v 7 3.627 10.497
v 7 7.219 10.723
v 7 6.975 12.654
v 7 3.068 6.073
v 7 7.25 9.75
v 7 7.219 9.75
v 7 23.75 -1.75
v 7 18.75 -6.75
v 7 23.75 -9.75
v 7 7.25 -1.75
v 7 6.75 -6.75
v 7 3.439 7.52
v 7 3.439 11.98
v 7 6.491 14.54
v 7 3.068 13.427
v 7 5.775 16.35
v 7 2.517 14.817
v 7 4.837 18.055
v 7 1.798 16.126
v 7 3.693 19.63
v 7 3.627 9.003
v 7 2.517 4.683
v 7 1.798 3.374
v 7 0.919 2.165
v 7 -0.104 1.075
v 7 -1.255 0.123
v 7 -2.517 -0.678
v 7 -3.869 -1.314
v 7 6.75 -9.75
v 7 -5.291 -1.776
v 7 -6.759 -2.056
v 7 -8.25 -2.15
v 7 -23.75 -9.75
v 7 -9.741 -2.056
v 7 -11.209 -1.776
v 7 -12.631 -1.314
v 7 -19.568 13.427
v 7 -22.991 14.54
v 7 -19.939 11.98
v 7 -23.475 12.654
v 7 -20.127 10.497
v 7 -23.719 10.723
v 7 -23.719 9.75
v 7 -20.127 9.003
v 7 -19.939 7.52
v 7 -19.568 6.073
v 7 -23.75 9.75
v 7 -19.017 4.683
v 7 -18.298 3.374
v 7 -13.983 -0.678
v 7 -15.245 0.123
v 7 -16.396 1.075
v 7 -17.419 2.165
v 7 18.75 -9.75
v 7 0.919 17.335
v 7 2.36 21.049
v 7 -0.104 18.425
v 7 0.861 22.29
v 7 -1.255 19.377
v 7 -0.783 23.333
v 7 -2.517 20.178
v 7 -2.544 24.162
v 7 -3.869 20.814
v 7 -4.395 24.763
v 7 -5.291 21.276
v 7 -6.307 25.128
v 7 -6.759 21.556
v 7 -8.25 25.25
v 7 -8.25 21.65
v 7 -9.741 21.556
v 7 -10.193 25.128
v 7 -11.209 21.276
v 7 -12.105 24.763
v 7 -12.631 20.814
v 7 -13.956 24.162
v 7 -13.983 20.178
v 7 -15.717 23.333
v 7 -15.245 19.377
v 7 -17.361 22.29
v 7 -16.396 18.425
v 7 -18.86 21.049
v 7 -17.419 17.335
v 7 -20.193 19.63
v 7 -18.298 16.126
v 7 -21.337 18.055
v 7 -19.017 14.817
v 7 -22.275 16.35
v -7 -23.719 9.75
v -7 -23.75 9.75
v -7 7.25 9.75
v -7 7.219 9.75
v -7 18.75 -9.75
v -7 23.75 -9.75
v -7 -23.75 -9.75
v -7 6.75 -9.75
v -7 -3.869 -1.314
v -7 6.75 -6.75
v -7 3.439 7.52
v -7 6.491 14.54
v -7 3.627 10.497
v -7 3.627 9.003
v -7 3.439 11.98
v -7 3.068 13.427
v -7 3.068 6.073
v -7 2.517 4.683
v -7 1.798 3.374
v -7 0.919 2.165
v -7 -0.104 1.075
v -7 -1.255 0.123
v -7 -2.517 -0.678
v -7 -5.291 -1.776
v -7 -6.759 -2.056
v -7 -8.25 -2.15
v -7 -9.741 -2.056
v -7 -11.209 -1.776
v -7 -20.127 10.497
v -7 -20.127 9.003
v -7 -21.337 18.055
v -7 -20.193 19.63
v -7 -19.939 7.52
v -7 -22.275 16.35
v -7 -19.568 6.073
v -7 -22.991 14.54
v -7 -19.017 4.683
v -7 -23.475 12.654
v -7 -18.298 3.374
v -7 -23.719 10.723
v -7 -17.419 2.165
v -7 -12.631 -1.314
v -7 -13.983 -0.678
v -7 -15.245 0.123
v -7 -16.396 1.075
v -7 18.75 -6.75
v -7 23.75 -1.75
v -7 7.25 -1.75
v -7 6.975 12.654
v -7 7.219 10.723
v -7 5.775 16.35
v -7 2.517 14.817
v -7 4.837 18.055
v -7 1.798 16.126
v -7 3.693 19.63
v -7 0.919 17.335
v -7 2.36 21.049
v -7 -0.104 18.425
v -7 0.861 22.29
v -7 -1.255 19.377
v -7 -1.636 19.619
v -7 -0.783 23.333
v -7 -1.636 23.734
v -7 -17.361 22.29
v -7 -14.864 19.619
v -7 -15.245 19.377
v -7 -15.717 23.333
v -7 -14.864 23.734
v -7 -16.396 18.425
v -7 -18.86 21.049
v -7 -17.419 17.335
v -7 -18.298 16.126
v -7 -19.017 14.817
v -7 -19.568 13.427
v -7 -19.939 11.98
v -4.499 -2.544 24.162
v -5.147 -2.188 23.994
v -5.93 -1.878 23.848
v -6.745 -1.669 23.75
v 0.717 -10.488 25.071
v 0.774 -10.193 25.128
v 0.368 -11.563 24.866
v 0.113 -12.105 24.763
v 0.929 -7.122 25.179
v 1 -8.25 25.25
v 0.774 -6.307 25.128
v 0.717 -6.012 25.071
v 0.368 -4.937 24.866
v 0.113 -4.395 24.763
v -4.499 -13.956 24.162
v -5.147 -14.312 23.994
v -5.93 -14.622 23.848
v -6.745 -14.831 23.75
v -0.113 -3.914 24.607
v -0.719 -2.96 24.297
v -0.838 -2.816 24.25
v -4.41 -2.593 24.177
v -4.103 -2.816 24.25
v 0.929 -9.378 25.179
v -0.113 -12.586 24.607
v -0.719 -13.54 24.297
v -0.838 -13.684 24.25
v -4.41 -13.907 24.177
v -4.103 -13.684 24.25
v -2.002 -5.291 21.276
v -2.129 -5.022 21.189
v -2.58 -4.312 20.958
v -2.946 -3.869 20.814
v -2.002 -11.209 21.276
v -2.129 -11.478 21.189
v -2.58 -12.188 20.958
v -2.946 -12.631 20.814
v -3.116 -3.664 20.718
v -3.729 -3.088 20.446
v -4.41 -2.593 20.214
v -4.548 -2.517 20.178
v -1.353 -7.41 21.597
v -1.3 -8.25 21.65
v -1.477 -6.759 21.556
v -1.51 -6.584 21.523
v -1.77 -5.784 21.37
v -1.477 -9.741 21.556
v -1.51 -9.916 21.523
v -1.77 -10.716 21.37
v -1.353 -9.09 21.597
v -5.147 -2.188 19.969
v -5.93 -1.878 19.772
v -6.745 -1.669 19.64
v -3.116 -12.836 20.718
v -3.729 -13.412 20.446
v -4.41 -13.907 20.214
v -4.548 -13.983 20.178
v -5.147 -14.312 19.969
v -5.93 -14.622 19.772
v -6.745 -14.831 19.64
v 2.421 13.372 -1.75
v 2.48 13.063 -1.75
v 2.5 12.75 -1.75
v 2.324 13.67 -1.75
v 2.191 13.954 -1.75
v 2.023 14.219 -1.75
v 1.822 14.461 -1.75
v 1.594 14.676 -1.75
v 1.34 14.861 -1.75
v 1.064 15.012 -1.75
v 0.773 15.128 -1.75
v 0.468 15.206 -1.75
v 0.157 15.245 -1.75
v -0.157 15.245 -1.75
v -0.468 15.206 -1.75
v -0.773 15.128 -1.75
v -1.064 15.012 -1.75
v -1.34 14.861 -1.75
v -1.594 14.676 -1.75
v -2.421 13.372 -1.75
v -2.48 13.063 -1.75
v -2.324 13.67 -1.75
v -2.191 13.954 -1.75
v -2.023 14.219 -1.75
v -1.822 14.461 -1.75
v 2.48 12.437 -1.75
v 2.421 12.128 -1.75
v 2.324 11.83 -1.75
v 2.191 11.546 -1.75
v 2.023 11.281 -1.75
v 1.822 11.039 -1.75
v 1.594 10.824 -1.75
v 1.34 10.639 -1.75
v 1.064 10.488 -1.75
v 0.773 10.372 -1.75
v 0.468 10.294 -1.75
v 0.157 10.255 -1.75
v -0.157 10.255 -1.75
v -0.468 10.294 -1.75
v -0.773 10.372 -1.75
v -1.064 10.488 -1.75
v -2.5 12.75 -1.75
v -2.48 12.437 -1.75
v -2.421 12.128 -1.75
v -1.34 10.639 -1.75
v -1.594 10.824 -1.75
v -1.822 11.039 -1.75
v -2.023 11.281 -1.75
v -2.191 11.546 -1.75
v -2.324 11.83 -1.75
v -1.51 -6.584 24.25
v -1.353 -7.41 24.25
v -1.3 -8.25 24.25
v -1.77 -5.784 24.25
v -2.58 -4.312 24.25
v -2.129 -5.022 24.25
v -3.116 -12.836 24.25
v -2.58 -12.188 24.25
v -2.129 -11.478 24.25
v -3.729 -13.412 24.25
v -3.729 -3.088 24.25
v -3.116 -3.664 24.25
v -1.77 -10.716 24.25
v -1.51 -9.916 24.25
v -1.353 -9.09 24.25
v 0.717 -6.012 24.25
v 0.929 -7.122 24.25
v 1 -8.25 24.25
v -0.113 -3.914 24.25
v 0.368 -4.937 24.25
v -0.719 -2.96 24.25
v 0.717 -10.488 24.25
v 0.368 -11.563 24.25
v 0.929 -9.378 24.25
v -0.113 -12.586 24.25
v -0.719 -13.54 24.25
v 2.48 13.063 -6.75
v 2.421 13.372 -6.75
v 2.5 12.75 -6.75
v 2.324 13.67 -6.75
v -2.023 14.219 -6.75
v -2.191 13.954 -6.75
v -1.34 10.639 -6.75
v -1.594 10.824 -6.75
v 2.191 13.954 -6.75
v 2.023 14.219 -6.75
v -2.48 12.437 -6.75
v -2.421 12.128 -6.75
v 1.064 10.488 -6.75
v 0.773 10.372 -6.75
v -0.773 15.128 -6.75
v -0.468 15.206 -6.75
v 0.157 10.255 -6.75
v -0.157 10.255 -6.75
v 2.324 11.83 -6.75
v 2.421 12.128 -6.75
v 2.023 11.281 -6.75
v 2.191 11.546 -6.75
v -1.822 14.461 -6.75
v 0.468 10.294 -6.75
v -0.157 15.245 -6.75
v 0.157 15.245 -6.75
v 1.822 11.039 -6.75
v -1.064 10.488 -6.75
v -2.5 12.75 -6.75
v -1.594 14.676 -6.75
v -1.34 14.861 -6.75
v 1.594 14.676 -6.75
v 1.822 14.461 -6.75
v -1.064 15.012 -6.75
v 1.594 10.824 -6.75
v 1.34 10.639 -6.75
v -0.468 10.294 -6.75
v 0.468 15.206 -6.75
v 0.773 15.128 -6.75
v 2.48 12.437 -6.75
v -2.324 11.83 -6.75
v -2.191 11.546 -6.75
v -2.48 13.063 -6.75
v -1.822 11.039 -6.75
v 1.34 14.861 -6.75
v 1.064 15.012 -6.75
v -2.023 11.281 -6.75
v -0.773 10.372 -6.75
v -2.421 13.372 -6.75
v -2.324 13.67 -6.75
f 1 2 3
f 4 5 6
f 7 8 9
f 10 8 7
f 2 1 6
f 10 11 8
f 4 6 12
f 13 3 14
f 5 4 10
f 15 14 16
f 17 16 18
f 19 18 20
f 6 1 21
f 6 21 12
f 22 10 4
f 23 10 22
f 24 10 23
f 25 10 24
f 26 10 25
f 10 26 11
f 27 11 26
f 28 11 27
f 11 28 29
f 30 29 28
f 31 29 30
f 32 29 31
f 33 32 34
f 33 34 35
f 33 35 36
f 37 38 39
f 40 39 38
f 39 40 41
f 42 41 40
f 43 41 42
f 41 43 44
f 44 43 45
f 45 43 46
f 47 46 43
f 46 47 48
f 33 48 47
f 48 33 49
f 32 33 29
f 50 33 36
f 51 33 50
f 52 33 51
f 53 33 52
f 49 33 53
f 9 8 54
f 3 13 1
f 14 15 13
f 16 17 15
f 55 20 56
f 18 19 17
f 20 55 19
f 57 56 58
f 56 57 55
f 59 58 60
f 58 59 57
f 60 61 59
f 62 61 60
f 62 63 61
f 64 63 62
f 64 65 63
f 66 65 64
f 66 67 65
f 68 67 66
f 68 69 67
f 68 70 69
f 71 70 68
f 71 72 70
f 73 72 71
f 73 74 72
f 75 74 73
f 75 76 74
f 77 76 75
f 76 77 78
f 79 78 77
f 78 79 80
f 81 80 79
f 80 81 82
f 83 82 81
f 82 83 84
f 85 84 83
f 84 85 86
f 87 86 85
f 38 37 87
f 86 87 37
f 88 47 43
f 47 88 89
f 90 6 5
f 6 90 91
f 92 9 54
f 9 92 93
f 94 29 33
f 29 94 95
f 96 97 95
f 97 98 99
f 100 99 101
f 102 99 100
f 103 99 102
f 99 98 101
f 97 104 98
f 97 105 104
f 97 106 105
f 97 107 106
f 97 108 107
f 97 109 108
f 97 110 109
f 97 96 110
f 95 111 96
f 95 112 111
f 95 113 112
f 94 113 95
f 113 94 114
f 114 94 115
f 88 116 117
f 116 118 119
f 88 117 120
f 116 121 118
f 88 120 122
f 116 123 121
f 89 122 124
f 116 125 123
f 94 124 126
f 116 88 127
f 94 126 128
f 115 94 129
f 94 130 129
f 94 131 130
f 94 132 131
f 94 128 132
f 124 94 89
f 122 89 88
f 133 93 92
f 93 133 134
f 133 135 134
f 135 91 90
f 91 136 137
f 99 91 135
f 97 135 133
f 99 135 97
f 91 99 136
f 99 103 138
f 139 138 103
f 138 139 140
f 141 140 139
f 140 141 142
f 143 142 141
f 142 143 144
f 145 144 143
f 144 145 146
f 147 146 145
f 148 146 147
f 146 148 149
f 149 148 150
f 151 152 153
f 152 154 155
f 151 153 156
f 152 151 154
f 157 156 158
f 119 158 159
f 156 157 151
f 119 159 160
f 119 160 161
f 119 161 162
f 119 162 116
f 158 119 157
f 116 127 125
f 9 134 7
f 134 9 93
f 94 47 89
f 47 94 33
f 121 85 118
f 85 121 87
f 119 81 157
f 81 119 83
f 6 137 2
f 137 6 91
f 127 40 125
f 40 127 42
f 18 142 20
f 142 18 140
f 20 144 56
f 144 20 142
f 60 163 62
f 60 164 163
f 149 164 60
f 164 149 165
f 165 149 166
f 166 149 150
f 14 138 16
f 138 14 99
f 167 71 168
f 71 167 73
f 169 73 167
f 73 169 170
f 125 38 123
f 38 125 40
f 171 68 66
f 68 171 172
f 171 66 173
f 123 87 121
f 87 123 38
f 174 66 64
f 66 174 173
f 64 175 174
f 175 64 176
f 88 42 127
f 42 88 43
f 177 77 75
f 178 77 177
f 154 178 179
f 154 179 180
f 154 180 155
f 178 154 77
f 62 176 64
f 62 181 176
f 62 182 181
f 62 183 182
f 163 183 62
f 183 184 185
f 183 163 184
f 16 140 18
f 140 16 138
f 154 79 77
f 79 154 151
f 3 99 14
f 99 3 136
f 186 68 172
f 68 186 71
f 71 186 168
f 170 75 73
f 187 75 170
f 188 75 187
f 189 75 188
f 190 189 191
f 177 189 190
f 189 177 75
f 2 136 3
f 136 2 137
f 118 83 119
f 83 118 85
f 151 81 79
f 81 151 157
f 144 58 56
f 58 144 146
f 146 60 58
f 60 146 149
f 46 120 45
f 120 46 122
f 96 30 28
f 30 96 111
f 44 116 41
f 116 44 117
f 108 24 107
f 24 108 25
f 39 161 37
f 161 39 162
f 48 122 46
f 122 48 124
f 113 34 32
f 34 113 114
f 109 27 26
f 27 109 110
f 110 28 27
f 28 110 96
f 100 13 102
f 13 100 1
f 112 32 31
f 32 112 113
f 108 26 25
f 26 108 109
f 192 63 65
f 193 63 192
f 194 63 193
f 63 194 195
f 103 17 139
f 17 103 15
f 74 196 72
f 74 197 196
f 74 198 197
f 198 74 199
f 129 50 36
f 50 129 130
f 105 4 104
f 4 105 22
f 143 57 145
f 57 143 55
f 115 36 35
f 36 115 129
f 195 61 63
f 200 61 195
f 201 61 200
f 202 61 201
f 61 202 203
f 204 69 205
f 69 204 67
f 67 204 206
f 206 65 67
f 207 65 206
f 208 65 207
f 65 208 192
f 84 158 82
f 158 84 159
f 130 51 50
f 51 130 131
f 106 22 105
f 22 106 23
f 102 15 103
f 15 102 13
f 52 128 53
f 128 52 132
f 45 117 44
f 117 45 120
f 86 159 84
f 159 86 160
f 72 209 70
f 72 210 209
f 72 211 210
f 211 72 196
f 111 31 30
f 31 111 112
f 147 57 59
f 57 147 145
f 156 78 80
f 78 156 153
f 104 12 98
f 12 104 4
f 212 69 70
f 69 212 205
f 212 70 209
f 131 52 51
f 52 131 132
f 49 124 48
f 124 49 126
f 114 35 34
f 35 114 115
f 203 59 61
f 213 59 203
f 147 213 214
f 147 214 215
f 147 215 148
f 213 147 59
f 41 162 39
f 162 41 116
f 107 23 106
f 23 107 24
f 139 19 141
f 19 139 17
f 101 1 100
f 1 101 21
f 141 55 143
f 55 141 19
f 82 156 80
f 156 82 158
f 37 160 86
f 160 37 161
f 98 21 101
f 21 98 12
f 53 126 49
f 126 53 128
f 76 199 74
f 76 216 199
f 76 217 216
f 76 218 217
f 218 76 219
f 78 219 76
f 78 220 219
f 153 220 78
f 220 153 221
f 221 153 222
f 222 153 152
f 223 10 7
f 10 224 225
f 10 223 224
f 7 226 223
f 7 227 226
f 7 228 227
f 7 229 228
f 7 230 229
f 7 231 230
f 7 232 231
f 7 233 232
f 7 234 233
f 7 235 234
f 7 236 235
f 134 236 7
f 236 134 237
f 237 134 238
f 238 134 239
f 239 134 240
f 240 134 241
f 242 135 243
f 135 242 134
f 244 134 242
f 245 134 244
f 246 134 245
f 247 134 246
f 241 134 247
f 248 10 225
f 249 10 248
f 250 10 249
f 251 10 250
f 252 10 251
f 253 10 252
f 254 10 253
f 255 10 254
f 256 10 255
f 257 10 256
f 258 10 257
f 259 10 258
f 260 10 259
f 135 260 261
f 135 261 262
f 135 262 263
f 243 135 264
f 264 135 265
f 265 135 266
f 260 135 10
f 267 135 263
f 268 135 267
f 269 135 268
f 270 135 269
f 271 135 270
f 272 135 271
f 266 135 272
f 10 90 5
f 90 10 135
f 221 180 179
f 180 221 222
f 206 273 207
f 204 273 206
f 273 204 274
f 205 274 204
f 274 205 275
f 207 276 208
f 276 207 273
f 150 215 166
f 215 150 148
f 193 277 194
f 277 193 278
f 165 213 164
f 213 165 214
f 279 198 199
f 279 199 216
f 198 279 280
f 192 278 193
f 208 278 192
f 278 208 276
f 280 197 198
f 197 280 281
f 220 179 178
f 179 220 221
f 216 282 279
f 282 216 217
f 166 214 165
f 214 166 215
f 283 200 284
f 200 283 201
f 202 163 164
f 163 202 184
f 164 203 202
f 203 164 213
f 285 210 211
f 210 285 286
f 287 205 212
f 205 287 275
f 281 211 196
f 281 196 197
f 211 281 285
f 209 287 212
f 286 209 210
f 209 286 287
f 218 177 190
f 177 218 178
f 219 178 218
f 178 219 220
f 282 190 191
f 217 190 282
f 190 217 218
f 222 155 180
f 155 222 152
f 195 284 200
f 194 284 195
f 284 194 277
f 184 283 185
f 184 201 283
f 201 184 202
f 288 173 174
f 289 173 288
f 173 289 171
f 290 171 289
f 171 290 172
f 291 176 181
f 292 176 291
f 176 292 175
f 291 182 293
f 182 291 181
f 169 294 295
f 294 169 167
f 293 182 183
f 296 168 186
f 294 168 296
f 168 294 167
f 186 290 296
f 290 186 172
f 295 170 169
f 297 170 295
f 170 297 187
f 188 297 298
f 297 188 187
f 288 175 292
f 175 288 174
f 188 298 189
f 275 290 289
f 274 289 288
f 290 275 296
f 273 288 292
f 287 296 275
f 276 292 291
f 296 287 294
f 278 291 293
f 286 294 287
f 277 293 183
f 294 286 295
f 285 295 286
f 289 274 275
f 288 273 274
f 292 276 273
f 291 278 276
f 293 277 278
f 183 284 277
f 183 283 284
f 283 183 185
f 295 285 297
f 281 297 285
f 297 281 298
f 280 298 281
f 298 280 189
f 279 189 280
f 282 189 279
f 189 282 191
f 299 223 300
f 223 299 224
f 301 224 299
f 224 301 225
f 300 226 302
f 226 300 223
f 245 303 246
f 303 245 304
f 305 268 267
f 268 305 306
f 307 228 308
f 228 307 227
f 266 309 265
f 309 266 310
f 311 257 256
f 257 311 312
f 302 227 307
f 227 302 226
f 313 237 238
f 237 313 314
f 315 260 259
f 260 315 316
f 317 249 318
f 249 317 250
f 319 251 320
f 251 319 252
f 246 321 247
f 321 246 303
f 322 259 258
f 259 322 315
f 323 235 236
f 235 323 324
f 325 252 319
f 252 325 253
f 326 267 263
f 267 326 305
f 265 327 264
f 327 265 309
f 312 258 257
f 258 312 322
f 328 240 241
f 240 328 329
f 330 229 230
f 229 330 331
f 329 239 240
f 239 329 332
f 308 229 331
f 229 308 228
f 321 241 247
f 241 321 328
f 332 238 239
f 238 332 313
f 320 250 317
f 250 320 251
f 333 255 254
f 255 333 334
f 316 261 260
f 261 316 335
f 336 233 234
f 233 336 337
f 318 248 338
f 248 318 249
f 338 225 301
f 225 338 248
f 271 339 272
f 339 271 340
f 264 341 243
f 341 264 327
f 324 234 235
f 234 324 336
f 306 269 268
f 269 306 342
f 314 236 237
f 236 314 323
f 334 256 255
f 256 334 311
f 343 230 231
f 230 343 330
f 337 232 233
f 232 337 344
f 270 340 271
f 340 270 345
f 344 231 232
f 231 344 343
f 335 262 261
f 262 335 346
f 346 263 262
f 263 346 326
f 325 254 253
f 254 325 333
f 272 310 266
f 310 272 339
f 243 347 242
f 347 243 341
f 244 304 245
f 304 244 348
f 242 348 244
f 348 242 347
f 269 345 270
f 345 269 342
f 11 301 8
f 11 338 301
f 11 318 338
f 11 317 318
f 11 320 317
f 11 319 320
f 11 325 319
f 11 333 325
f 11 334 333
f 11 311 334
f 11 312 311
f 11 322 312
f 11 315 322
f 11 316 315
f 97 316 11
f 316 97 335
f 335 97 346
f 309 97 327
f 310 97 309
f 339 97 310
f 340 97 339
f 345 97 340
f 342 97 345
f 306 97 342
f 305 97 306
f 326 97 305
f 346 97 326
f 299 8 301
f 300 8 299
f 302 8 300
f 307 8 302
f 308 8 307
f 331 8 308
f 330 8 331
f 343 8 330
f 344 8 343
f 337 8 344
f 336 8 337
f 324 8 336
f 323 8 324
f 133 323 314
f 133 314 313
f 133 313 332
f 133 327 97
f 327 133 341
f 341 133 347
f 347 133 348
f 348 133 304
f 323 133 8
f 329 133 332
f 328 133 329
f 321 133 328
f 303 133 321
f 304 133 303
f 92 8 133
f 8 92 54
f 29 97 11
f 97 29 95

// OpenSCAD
// bracket for t-valve

body_dia = 23;
valve_axle_dia = 13;


m5_dia = 5;
m5_pilot = 4.2;

// mount rail to valve centerline
mrail_to_valve = 21;
mrail_width = 12;

min_wall = 4;
below_valve = 31 - body_dia;
block_top = 3;      // mat'l on top above the body

block_x = 14;
// 5 mm + (mount rail distance on cl) + min thick
block_y = 5 + (mrail_width/2) + mrail_to_valve + body_dia/2 + min_wall;
block_z = below_valve + body_dia/2;

// mounting rail cut-out
cut_thickness = 8;
cut_x = block_x;
cut_y = block_y - (body_dia + min_wall * 2);
cut_z = block_z - cut_thickness;

// body cylinder - translate coord
body_ty = block_y/2 - (5 + mrail_width/2 + mrail_to_valve); 
body_tz = -block_z/2 + (below_valve + body_dia/2);
        
$fn = 50;

difference () {
    union () {
        cube([block_x, block_y, block_z], center = true);

        translate([0, body_ty, body_tz])
        rotate([0,90,0])
        cylinder (r = body_dia/2 + min_wall, h = block_x, center = true);
    }
    // subtract
    {
        // body cylindar
        translate([0, body_ty, body_tz])
        rotate([0, 90, 0])
        cylinder(r = (body_dia/2 + 0.4), h = block_x, center = true);
        
        // mounting rail cut-out
        translate([0, block_y/2 - cut_y/2, -block_z/2 + cut_thickness + cut_z/2])
        cube([cut_x, cut_y, cut_z], center = true);
        
        // valve_axle
        axle_tx = -block_x/2  - 1 ;
        axle_ty = body_ty;
        axle_tz = (block_z/2 + (body_dia/2 + min_wall)) - min_wall/2;
        translate([axle_tx, axle_ty, axle_tz])
        cylinder(r = valve_axle_dia/2 + 0.2, h = min_wall + 4, center = true);
        
        // handle relief
        translate([axle_tx, axle_ty, block_z/2 + body_dia/2 + min_wall - 1/2])
        cylinder(r = 18/2, h = 1, center = true);
        
        // mounting hole
        mnt_ty =  block_y/2 - 5 - mrail_width/2;
        mnt_tz = -block_z/2 + cut_thickness/2; 
        translate([0,mnt_ty,mnt_tz])
        #cylinder(r = m5_dia/2, h = cut_thickness, center = true);
        
        // rail cut-out
        rail_cutout_thickness = 3;
        rail_tz = -block_z/2 + rail_cutout_thickness/2;
        translate([0,mnt_ty,rail_tz])
        #cube([block_x, mrail_width, rail_cutout_thickness], center = true);
        
    }
}
